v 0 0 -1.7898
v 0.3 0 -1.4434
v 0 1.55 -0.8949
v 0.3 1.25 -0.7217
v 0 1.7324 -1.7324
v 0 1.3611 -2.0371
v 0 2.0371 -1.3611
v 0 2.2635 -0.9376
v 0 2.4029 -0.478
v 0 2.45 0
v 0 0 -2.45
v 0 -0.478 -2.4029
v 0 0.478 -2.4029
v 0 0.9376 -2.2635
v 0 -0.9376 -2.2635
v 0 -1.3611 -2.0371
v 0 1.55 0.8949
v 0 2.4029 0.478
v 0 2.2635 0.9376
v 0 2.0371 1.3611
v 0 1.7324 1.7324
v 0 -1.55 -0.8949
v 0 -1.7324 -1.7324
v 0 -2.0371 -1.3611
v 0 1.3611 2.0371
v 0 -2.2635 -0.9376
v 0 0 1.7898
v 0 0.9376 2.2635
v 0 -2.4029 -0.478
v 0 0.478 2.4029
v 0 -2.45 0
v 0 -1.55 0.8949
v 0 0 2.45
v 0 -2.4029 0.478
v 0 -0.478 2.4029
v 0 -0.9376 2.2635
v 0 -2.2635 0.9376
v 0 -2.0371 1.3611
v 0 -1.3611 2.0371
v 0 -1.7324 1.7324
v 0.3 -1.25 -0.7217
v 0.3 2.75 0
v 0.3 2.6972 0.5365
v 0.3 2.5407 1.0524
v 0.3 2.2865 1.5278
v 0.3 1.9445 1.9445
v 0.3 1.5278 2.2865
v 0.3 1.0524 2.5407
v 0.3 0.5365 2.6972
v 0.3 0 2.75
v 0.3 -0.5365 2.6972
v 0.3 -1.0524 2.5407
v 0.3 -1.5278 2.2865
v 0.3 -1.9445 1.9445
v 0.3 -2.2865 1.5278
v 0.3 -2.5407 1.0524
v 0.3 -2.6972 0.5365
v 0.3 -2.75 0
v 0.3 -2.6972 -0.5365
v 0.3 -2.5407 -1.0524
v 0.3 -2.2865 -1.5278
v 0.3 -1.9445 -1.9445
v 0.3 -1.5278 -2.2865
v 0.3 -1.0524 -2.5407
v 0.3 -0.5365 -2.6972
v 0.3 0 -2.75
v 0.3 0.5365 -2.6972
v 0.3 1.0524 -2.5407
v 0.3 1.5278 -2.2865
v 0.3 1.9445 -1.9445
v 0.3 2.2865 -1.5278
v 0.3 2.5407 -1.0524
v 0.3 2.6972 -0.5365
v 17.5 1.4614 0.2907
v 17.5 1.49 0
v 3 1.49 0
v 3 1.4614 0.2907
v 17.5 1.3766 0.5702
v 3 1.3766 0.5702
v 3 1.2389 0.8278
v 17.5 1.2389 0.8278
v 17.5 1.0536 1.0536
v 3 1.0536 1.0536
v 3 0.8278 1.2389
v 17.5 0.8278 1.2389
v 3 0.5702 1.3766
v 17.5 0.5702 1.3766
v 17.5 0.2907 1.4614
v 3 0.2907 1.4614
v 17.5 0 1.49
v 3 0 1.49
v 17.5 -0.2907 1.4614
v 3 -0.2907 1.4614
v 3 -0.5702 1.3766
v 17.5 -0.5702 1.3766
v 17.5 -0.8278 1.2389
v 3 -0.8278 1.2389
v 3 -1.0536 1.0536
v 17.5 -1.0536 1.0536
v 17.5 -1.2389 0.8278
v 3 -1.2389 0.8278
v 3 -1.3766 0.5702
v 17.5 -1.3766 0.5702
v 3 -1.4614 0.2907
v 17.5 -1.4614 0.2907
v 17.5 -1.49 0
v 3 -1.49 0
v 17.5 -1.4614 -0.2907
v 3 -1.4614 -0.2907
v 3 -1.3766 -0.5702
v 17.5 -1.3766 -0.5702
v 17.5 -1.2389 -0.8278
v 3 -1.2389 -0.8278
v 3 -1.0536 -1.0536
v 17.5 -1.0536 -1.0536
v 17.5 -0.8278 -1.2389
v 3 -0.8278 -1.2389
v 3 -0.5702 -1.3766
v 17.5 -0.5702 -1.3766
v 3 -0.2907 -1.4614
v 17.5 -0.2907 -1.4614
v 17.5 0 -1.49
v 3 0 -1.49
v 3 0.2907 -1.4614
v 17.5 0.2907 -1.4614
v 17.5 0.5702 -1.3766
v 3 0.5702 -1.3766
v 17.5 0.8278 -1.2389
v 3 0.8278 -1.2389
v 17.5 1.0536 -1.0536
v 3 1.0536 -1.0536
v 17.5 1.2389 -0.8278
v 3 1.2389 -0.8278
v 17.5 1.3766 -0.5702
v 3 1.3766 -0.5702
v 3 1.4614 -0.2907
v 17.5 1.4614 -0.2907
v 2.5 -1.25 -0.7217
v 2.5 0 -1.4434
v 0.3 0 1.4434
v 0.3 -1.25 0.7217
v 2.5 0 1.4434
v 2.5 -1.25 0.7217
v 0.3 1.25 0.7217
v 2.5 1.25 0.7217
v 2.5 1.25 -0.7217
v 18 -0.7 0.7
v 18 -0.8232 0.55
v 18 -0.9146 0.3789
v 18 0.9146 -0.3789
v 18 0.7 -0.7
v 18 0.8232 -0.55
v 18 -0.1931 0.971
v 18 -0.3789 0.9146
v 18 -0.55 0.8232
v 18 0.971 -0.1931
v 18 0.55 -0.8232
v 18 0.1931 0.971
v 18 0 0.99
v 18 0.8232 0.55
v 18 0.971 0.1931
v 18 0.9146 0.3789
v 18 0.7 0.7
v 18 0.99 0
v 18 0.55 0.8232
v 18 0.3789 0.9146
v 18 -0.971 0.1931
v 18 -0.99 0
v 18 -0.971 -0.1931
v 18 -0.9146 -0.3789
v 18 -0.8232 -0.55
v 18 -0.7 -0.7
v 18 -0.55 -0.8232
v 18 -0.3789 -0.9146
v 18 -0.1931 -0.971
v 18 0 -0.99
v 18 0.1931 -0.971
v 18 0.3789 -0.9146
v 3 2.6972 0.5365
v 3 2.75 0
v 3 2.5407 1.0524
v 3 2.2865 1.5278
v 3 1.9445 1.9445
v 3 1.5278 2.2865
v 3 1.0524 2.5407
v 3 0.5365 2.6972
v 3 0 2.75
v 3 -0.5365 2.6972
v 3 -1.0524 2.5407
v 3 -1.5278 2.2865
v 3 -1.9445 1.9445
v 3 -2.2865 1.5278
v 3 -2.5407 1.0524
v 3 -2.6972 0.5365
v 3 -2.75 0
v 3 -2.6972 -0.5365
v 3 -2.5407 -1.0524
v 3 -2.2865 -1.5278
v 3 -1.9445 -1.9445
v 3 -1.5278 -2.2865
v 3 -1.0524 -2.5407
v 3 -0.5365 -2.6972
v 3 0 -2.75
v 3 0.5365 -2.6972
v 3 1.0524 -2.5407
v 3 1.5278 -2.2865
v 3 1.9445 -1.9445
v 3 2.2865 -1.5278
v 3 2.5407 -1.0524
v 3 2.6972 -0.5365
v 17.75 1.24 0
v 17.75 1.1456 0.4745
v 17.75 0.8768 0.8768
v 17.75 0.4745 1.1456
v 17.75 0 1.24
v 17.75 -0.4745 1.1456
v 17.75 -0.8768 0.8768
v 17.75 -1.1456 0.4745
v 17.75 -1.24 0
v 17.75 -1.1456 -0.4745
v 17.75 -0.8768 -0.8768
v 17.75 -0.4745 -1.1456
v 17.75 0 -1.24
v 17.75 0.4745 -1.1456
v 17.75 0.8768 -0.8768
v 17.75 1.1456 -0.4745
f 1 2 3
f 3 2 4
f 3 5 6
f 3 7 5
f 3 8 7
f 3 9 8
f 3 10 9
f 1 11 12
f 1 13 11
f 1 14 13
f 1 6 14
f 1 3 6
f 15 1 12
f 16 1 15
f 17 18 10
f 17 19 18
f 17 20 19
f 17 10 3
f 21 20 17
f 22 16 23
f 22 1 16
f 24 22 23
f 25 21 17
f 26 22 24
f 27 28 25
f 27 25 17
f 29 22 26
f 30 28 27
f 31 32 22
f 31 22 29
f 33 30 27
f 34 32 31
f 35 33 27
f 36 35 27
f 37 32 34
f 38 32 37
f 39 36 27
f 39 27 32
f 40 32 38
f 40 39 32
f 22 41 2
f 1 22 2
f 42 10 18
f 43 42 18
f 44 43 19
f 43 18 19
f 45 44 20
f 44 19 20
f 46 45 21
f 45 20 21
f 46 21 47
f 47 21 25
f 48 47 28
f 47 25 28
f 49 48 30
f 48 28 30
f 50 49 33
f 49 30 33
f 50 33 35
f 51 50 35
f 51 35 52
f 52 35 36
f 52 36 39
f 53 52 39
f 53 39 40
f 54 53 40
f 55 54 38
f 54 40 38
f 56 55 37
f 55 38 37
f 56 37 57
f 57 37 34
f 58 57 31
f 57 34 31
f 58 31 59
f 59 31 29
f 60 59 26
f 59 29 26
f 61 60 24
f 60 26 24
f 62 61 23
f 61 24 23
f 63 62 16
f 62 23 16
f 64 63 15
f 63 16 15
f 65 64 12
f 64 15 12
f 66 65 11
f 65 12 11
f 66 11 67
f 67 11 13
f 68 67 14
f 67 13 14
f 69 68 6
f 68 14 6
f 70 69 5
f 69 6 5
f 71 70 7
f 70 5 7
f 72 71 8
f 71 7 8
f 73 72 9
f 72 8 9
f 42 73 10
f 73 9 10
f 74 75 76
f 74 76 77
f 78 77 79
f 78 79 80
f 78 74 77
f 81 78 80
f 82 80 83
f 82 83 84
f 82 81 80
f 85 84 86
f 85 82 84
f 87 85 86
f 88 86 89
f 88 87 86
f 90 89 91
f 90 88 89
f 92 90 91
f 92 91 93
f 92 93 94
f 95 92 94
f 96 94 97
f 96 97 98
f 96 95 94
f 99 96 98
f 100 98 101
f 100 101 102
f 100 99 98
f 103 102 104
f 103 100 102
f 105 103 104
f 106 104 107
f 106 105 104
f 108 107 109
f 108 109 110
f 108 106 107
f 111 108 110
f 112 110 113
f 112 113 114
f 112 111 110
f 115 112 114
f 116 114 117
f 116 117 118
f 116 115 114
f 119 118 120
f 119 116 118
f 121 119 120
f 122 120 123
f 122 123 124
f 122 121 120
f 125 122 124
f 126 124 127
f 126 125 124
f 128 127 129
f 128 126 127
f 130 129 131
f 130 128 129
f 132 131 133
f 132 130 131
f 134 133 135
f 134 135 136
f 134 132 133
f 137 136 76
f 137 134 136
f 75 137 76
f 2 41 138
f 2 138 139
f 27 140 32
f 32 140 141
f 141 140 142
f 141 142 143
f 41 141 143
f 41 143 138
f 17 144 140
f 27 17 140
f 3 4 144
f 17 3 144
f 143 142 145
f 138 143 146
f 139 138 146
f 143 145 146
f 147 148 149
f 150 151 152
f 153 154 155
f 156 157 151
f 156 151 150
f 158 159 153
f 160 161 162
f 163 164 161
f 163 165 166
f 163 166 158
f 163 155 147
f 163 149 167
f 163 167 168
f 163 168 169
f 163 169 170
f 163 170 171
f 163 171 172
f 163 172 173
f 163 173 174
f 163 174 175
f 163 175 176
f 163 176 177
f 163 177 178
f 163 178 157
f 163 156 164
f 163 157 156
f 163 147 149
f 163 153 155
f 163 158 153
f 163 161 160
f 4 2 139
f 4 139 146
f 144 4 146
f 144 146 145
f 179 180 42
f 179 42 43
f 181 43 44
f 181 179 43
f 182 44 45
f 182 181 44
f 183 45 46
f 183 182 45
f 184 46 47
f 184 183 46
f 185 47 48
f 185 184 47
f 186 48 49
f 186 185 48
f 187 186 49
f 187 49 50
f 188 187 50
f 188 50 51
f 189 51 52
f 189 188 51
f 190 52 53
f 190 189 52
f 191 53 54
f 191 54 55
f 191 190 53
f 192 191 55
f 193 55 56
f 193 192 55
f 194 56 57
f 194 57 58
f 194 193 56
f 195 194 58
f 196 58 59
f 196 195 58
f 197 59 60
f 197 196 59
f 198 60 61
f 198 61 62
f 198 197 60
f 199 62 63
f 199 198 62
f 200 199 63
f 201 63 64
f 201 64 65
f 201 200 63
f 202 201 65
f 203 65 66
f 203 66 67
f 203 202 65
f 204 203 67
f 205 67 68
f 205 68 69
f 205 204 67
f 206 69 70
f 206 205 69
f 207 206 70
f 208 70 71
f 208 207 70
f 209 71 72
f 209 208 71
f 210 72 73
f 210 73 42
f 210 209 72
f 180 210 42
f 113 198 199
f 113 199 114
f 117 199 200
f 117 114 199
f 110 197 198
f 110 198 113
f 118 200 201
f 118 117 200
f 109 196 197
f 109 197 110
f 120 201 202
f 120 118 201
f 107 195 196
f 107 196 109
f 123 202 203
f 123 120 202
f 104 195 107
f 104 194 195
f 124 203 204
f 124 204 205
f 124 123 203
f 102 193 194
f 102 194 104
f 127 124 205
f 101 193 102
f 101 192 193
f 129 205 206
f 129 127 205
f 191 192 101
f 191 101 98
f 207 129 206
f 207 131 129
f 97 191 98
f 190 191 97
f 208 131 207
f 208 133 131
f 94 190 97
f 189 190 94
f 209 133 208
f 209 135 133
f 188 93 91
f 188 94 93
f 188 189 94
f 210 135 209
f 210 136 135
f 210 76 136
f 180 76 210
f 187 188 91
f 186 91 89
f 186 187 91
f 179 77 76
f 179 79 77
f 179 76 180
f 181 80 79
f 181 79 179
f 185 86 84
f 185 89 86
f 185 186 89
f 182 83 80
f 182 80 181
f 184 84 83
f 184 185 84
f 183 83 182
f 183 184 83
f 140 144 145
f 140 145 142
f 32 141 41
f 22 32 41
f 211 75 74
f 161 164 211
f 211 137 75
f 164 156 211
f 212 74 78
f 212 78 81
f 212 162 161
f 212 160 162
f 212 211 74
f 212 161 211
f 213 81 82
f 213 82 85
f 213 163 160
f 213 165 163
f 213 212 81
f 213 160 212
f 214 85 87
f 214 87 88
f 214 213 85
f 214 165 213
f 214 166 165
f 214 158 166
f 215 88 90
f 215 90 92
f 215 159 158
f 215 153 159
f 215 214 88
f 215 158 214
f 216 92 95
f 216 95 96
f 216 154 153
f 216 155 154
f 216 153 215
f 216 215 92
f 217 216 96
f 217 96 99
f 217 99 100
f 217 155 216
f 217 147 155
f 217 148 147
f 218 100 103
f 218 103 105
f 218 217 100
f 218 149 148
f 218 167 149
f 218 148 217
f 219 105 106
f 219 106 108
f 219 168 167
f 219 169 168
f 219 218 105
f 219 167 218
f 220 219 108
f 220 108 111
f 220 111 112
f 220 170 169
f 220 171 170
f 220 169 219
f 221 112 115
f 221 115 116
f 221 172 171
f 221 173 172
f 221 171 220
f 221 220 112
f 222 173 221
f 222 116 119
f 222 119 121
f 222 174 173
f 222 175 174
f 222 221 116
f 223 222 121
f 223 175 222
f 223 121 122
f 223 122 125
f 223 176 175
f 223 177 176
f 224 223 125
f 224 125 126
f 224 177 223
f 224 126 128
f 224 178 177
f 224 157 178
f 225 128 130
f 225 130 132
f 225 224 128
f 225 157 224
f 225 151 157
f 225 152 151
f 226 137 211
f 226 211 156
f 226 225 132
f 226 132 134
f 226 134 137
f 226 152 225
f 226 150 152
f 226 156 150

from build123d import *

# Parameters (mm, degrees)
CHAMFER1_SIZE      = 0.5
CHAMFER2_SIZE      = 0.3
CUT_EXTRUDE1_DEPTH = 2.5
CHAMFER3_SIZE      = 0.3


with BuildPart() as part:
    # Sketch1 → Revolve1 (revolve)
    with BuildSketch(Plane.XY):
        Polygon((0, 0), (0, 2.75), (3, 2.75), (3, 1.49), (18, 1.49), (18, 0), align=None)
    revolve(axis=Axis((-88.705490849, 0, 0), (1, 0, 0)))

    # Chamfer1
    chamfer1_edges = [part.edges().sort_by_distance(p)[0] for p in [
        (18, -1.49, 0),
    ]]
    chamfer(chamfer1_edges, length=CHAMFER1_SIZE)

    # Chamfer2
    chamfer2_edges = [part.edges().sort_by_distance(p)[0] for p in [
        (0, -2.75, 0),
    ]]
    chamfer(chamfer2_edges, length=CHAMFER2_SIZE)

    # Sketch3 → Cut-Extrude1 (cut)
    with BuildSketch(Plane(origin=(0, 0, 0), x_dir=(0, 0, -1), z_dir=(1, 0, 0))):
        Polygon((-1.443375673, 0), (-0.721687836, -1.25), (0.721687836, -1.25), (1.443375673, 0), (0.721687836, 1.25), (-0.721687836, 1.25), align=None)
    extrude(amount=CUT_EXTRUDE1_DEPTH, mode=Mode.SUBTRACT)

    # Chamfer3
    chamfer3_edges = [part.edges().sort_by_distance(p)[0] for p in [
        (0, 0.625, 1.082531755),
        (0, -0.625, 1.082531755),
        (0, -1.25, 0),
        (0, -0.625, -1.082531755),
        (0, 0.625, -1.082531755),
        (0, 1.25, 0),
    ]]
    chamfer(chamfer3_edges, length=CHAMFER3_SIZE)


solid = part.part
